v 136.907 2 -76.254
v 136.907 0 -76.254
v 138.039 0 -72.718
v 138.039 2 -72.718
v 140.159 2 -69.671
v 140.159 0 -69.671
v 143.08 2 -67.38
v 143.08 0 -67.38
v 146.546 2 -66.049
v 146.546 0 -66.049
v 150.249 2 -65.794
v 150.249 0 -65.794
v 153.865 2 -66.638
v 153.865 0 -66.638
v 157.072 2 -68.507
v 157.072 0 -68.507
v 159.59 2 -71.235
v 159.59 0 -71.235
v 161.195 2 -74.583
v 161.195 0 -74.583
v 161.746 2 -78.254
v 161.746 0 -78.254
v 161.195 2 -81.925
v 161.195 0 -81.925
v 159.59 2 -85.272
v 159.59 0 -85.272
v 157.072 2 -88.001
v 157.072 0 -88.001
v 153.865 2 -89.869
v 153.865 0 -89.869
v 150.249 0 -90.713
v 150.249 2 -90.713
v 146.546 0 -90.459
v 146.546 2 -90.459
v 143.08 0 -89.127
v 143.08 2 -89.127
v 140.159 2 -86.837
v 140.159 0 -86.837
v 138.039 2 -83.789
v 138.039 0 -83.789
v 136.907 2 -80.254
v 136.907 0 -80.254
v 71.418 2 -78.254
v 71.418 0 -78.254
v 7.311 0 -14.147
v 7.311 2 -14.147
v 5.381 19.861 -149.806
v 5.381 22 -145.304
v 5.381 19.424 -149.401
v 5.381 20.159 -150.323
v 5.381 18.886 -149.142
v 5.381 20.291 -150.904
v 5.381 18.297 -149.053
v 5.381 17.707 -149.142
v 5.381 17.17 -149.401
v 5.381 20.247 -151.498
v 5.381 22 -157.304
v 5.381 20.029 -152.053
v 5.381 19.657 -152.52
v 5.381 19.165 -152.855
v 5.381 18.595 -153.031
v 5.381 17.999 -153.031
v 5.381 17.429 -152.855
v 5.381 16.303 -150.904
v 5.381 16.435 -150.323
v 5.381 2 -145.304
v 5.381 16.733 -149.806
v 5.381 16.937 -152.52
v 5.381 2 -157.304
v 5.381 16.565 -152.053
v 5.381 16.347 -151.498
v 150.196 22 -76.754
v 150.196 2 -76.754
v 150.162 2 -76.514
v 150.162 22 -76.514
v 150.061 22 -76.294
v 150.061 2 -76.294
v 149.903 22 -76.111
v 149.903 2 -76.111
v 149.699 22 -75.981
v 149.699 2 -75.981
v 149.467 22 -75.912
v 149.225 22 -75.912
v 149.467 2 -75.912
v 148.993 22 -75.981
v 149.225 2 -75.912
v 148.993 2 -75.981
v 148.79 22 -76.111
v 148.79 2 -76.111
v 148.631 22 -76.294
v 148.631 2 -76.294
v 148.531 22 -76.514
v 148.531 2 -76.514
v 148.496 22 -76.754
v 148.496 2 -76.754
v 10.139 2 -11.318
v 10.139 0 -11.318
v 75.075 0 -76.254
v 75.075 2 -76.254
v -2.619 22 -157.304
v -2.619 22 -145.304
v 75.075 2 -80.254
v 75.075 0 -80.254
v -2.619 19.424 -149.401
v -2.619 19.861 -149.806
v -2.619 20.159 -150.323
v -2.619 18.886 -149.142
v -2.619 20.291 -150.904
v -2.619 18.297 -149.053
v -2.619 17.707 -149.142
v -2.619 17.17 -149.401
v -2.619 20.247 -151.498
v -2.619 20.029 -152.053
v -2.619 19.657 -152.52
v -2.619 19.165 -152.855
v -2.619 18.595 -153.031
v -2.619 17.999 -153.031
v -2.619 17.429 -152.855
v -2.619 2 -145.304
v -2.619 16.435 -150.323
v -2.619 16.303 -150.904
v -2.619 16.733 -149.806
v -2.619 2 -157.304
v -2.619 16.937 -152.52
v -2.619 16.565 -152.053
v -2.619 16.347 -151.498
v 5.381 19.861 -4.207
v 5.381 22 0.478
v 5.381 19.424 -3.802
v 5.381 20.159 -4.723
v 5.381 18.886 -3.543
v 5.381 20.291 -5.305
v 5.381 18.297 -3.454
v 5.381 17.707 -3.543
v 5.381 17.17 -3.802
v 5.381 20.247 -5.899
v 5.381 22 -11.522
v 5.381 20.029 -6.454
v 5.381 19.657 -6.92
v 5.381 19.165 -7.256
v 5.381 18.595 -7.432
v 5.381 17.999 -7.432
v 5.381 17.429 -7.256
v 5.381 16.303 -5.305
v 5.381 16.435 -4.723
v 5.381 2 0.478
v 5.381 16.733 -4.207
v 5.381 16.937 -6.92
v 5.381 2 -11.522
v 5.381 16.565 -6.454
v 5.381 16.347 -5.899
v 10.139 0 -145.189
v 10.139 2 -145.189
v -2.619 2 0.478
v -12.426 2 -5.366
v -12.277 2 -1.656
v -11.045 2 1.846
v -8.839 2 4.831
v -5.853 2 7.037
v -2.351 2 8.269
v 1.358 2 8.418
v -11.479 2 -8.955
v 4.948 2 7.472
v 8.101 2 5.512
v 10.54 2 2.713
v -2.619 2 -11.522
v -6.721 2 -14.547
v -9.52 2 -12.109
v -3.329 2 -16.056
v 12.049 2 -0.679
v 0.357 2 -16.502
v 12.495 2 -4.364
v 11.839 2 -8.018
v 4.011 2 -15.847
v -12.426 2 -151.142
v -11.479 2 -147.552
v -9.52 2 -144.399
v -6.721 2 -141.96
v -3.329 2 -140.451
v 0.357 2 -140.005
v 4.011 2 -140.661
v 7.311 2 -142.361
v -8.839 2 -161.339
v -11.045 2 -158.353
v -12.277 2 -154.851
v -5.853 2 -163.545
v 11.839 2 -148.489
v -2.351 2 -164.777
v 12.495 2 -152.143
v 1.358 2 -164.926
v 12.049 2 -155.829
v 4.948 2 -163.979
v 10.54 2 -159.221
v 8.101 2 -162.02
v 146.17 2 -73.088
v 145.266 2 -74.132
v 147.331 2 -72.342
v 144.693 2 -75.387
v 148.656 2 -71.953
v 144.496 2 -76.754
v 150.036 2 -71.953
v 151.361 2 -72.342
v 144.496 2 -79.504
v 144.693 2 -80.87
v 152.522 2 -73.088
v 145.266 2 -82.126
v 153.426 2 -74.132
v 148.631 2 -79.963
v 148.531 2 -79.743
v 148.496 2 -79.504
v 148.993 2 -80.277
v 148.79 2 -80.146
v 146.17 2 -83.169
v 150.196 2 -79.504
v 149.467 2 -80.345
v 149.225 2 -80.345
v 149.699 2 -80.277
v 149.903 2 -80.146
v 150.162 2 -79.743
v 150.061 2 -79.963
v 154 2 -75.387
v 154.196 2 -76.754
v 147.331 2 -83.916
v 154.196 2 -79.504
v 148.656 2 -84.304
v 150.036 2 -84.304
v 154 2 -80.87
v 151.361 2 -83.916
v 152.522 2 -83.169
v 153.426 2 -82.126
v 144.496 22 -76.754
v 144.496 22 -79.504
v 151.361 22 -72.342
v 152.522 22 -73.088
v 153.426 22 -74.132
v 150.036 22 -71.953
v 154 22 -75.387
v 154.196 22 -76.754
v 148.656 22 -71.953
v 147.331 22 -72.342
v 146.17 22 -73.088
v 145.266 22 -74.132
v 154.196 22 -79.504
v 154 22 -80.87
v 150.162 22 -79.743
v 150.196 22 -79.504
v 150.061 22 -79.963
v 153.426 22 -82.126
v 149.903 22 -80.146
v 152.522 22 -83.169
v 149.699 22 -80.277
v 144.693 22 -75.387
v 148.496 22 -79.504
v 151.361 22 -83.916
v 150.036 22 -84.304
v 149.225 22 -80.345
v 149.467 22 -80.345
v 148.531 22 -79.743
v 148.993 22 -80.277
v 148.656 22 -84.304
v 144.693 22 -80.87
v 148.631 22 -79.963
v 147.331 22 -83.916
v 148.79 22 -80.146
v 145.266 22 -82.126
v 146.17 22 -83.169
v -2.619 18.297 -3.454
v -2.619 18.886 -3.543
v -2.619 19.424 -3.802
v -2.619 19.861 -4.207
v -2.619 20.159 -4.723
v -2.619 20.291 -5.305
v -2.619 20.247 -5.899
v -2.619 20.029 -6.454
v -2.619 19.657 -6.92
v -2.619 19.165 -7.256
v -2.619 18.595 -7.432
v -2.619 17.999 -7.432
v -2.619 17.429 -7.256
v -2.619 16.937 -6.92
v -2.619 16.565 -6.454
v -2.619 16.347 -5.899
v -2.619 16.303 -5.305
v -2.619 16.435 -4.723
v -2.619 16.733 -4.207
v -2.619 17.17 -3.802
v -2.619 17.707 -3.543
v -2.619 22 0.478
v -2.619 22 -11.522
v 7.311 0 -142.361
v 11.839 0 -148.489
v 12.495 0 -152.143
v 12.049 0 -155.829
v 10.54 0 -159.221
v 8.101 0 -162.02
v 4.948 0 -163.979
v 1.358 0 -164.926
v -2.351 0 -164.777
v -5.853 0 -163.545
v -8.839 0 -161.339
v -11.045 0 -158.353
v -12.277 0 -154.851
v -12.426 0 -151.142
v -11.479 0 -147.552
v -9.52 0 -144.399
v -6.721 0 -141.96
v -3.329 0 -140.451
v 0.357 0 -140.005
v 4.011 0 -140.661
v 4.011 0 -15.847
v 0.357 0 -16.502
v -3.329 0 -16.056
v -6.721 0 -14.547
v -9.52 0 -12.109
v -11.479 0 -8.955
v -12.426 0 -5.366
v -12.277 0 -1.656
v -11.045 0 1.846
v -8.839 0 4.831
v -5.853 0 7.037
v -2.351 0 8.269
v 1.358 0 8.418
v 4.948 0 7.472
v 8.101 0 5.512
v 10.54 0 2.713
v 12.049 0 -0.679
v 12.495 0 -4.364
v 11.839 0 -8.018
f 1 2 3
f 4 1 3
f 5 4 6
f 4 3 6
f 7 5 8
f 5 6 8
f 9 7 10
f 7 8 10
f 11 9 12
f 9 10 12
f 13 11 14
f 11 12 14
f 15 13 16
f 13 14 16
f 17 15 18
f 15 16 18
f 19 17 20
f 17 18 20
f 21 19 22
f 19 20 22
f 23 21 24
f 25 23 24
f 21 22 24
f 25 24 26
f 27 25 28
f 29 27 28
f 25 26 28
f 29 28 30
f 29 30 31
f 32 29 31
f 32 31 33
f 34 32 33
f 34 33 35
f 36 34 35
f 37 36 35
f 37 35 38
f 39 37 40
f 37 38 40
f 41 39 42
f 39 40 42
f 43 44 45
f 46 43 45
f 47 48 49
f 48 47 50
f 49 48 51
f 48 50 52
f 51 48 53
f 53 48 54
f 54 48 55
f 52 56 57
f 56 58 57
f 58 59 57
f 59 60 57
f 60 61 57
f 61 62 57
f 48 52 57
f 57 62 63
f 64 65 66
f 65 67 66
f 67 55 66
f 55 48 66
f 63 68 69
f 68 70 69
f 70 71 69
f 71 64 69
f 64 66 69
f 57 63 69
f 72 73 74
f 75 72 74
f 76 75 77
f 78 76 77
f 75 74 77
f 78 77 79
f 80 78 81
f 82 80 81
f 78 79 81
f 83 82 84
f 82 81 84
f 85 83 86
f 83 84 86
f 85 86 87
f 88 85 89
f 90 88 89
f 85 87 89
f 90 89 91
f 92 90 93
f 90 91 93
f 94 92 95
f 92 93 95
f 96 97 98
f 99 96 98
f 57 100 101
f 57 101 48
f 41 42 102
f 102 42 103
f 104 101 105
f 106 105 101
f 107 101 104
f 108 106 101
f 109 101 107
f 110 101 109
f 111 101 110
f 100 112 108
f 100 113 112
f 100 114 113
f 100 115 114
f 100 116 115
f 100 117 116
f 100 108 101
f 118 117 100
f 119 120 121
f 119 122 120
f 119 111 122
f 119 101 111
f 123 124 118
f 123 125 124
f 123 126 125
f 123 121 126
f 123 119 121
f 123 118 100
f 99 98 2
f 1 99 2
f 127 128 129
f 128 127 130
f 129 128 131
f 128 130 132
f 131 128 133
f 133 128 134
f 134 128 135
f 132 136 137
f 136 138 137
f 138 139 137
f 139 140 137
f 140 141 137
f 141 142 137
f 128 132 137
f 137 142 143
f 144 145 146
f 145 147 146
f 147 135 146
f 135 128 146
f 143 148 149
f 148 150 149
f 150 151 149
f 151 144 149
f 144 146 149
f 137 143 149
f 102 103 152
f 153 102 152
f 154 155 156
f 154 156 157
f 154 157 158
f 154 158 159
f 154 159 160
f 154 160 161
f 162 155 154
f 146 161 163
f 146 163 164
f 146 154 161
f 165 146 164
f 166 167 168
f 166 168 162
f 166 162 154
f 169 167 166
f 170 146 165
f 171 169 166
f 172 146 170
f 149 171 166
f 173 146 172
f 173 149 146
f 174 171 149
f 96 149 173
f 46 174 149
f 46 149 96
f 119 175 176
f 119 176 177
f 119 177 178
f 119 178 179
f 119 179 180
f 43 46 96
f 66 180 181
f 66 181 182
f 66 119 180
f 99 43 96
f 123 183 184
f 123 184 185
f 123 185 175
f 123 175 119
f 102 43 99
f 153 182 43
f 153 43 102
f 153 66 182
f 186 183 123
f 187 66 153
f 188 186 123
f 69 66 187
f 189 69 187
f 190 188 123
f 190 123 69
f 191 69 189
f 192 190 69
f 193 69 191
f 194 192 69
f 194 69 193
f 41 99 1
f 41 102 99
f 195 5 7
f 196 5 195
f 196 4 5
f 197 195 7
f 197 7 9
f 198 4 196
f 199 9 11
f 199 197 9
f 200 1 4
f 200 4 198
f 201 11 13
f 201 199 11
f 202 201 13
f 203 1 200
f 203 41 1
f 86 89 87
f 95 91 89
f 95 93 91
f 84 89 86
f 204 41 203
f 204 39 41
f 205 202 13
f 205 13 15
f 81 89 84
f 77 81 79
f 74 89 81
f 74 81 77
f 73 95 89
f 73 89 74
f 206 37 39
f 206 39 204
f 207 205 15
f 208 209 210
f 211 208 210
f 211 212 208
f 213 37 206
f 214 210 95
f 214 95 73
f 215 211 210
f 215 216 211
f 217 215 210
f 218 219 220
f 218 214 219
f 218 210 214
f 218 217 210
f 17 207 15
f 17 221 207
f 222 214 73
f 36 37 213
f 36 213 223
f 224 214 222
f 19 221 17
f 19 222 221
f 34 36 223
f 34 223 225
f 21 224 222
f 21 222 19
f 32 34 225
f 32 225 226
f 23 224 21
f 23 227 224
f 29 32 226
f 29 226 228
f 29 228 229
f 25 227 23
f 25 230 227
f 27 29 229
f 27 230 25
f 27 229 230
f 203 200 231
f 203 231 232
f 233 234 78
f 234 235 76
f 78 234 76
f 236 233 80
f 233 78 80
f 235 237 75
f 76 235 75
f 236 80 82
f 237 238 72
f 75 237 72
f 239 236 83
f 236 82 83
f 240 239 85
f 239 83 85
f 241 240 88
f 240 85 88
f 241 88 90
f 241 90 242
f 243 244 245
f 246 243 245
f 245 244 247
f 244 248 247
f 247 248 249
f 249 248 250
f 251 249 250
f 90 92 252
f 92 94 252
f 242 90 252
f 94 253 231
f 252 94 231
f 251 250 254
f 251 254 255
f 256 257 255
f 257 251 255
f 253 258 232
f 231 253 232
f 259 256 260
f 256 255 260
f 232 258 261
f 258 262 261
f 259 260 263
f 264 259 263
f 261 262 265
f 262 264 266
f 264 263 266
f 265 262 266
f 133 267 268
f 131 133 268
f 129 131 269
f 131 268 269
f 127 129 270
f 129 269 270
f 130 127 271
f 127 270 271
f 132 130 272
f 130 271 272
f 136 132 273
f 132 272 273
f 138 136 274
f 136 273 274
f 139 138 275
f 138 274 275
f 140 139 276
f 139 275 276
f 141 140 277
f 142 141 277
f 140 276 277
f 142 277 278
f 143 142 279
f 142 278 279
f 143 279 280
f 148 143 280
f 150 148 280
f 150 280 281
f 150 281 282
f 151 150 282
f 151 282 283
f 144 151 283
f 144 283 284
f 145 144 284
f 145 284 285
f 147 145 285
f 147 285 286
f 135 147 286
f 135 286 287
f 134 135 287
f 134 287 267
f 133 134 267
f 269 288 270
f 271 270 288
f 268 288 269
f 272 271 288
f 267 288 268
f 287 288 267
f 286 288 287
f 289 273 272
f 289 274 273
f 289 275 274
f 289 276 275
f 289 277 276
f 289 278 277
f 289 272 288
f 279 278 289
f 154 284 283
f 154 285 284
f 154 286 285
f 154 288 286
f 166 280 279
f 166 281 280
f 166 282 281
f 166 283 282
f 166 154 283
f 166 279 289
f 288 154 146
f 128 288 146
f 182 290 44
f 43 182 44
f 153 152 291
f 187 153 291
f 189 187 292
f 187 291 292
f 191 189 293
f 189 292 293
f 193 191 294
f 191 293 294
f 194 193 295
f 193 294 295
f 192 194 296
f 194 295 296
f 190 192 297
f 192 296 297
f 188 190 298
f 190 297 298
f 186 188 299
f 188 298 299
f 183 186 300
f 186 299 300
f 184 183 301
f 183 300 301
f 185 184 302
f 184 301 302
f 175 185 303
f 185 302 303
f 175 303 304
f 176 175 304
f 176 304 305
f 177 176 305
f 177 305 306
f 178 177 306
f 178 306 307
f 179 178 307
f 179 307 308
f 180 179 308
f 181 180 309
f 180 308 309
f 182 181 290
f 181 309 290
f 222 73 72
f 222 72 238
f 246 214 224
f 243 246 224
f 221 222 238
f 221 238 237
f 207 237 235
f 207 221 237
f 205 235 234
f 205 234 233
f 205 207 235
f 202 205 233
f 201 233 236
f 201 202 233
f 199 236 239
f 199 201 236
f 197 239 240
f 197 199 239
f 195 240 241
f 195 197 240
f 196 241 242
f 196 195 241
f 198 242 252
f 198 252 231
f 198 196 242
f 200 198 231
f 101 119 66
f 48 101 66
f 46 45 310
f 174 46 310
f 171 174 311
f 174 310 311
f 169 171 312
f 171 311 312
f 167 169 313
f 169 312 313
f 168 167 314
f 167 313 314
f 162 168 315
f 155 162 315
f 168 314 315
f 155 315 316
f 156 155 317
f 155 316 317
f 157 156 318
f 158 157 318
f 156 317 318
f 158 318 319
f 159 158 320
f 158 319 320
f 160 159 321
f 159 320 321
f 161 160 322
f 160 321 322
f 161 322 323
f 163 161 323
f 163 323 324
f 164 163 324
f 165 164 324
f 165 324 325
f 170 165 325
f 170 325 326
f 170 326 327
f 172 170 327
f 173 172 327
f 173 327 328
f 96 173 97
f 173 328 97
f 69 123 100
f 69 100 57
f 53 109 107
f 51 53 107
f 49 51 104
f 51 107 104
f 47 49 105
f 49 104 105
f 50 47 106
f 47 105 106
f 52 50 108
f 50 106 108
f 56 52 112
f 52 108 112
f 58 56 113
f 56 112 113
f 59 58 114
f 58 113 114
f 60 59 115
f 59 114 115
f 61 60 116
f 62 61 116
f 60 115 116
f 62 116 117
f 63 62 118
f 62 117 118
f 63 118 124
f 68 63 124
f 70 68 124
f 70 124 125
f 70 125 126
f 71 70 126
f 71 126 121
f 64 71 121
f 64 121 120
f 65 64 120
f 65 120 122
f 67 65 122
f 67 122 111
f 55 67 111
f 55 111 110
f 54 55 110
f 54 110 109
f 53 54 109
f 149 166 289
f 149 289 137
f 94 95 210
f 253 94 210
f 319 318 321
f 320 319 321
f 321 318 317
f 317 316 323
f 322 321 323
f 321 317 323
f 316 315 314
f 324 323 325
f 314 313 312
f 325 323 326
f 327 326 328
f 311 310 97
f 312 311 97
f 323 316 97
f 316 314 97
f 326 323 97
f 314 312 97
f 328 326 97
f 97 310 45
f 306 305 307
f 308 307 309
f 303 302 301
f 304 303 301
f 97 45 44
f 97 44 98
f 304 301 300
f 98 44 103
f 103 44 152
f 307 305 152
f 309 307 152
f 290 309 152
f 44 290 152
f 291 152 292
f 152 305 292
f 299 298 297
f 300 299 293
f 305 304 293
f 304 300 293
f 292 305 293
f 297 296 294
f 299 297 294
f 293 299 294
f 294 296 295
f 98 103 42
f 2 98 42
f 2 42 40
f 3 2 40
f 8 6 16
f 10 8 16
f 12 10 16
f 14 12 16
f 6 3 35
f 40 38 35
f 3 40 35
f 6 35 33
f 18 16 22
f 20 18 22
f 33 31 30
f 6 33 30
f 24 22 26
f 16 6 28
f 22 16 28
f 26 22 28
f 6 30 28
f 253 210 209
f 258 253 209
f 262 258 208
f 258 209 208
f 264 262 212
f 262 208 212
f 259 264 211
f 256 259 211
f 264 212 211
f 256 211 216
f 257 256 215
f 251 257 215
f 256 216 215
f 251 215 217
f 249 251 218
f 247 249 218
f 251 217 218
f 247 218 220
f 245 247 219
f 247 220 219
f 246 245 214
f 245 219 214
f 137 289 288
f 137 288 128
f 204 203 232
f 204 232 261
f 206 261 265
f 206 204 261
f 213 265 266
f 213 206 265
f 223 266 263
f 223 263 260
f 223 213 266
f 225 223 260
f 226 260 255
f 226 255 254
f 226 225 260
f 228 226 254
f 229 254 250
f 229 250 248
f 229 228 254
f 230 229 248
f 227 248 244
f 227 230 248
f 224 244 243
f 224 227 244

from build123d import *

# Parameters (mm, degrees)
BOSS_EXTRUDE1_DEPTH = 2
SKETCH2_W           = 8
SKETCH2_H           = 12
BOSS_EXTRUDE2_DEPTH = 20
SKETCH6_W           = 4
SKETCH6_H           = 2.75
CUT_EXTRUDE3_DEPTH  = 20
SKETCH7_R           = 2
CUT_EXTRUDE4_DEPTH  = 10


with BuildPart() as part:
    # Sketch1 → Boss-Extrude1 (new body)
    with BuildSketch(Plane(origin=(0, 0, 0), x_dir=(1, 0, 0), z_dir=(0, 1, 0))):
        with BuildLine():
            Line((75.074639149, 80.253787975), (10.139177746, 145.189249379))
            ThreePointArc((10.139177746, 145.189249379), (-8.838834765, 161.338834765), (7.310750621, 142.360822254))
            Line((7.310750621, 142.360822254), (71.4177849, 78.253787975))
            Line((71.4177849, 78.253787975), (7.310750621, 14.146753697))
            ThreePointArc((7.310750621, 14.146753697), (-8.838834765, -4.831258814), (10.139177746, 11.318326572))
            Line((10.139177746, 11.318326572), (75.074639149, 76.253787975))
            Line((75.074639149, 76.253787975), (136.907249345, 76.253787975))
            ThreePointArc((136.907249345, 76.253787975), (161.746212025, 78.253787975), (136.907249345, 80.253787975))
            Line((136.907249345, 80.253787975), (75.074639149, 80.253787975))
        make_face()
    extrude(amount=BOSS_EXTRUDE1_DEPTH)

    # Sketch2 → Boss-Extrude2 (add)
    # profile 1 of 3: a face of its own
    with BuildSketch(Plane(origin=(0, 2, 0), x_dir=(1, 0, 0), z_dir=(0, 1, 0))):
        with BuildLine():
            Line((144.496212025, 76.753787975), (144.496212025, 79.503787975))
            ThreePointArc((144.496212025, 79.503787975), (149.346212025, 84.353787975), (154.196212025, 79.503787975))
            Line((154.196212025, 79.503787975), (154.196212025, 76.753787975))
            ThreePointArc((154.196212025, 76.753787975), (149.346212025, 71.903787975), (144.496212025, 76.753787975))
        make_face()
        with BuildLine():
            Line((148.496212025, 76.753787975), (148.496212025, 79.503787975))
            ThreePointArc((148.496212025, 79.503787975), (149.346212025, 80.353787975), (150.196212025, 79.503787975))
            Line((150.196212025, 79.503787975), (150.196212025, 76.753787975))
            ThreePointArc((150.196212025, 76.753787975), (149.346212025, 75.903787975), (148.496212025, 76.753787975))
        make_face(mode=Mode.SUBTRACT)
    # profile 2 of 3: a face of its own
    with BuildSketch(Plane(origin=(0, 2, 0), x_dir=(1, 0, 0), z_dir=(0, 1, 0))):
        with Locations((1.381469518, 5.521849013)):
            Rectangle(SKETCH2_W, SKETCH2_H)
    # profile 3 of 3: a face of its own
    with BuildSketch(Plane(origin=(0, 2, 0), x_dir=(1, 0, 0), z_dir=(0, 1, 0))):
        with Locations((1.381469518, 151.304233441)):
            Rectangle(SKETCH2_W, SKETCH2_H)
    extrude(amount=BOSS_EXTRUDE2_DEPTH)

    # Sketch6 → Cut-Extrude3 (cut)
    with BuildSketch(Plane(origin=(0, 22, 0), x_dir=(1, 0, 0), z_dir=(0, 1, 0))):
        with Locations((152.196212025, 78.128787975)):
            Rectangle(SKETCH6_W, SKETCH6_H)
    extrude(amount=-CUT_EXTRUDE3_DEPTH, mode=Mode.SUBTRACT)

    # Sketch7 → Cut-Extrude4 (cut)
    with BuildSketch(Plane.ZY.offset(2.618530482)):
        with Locations((-5.454118169, 18.296936601)):
            Circle(SKETCH7_R)
        with Locations((-151.053457781, 18.296936601)):
            Circle(SKETCH7_R)
    extrude(amount=-CUT_EXTRUDE4_DEPTH, mode=Mode.SUBTRACT)


solid = part.part
